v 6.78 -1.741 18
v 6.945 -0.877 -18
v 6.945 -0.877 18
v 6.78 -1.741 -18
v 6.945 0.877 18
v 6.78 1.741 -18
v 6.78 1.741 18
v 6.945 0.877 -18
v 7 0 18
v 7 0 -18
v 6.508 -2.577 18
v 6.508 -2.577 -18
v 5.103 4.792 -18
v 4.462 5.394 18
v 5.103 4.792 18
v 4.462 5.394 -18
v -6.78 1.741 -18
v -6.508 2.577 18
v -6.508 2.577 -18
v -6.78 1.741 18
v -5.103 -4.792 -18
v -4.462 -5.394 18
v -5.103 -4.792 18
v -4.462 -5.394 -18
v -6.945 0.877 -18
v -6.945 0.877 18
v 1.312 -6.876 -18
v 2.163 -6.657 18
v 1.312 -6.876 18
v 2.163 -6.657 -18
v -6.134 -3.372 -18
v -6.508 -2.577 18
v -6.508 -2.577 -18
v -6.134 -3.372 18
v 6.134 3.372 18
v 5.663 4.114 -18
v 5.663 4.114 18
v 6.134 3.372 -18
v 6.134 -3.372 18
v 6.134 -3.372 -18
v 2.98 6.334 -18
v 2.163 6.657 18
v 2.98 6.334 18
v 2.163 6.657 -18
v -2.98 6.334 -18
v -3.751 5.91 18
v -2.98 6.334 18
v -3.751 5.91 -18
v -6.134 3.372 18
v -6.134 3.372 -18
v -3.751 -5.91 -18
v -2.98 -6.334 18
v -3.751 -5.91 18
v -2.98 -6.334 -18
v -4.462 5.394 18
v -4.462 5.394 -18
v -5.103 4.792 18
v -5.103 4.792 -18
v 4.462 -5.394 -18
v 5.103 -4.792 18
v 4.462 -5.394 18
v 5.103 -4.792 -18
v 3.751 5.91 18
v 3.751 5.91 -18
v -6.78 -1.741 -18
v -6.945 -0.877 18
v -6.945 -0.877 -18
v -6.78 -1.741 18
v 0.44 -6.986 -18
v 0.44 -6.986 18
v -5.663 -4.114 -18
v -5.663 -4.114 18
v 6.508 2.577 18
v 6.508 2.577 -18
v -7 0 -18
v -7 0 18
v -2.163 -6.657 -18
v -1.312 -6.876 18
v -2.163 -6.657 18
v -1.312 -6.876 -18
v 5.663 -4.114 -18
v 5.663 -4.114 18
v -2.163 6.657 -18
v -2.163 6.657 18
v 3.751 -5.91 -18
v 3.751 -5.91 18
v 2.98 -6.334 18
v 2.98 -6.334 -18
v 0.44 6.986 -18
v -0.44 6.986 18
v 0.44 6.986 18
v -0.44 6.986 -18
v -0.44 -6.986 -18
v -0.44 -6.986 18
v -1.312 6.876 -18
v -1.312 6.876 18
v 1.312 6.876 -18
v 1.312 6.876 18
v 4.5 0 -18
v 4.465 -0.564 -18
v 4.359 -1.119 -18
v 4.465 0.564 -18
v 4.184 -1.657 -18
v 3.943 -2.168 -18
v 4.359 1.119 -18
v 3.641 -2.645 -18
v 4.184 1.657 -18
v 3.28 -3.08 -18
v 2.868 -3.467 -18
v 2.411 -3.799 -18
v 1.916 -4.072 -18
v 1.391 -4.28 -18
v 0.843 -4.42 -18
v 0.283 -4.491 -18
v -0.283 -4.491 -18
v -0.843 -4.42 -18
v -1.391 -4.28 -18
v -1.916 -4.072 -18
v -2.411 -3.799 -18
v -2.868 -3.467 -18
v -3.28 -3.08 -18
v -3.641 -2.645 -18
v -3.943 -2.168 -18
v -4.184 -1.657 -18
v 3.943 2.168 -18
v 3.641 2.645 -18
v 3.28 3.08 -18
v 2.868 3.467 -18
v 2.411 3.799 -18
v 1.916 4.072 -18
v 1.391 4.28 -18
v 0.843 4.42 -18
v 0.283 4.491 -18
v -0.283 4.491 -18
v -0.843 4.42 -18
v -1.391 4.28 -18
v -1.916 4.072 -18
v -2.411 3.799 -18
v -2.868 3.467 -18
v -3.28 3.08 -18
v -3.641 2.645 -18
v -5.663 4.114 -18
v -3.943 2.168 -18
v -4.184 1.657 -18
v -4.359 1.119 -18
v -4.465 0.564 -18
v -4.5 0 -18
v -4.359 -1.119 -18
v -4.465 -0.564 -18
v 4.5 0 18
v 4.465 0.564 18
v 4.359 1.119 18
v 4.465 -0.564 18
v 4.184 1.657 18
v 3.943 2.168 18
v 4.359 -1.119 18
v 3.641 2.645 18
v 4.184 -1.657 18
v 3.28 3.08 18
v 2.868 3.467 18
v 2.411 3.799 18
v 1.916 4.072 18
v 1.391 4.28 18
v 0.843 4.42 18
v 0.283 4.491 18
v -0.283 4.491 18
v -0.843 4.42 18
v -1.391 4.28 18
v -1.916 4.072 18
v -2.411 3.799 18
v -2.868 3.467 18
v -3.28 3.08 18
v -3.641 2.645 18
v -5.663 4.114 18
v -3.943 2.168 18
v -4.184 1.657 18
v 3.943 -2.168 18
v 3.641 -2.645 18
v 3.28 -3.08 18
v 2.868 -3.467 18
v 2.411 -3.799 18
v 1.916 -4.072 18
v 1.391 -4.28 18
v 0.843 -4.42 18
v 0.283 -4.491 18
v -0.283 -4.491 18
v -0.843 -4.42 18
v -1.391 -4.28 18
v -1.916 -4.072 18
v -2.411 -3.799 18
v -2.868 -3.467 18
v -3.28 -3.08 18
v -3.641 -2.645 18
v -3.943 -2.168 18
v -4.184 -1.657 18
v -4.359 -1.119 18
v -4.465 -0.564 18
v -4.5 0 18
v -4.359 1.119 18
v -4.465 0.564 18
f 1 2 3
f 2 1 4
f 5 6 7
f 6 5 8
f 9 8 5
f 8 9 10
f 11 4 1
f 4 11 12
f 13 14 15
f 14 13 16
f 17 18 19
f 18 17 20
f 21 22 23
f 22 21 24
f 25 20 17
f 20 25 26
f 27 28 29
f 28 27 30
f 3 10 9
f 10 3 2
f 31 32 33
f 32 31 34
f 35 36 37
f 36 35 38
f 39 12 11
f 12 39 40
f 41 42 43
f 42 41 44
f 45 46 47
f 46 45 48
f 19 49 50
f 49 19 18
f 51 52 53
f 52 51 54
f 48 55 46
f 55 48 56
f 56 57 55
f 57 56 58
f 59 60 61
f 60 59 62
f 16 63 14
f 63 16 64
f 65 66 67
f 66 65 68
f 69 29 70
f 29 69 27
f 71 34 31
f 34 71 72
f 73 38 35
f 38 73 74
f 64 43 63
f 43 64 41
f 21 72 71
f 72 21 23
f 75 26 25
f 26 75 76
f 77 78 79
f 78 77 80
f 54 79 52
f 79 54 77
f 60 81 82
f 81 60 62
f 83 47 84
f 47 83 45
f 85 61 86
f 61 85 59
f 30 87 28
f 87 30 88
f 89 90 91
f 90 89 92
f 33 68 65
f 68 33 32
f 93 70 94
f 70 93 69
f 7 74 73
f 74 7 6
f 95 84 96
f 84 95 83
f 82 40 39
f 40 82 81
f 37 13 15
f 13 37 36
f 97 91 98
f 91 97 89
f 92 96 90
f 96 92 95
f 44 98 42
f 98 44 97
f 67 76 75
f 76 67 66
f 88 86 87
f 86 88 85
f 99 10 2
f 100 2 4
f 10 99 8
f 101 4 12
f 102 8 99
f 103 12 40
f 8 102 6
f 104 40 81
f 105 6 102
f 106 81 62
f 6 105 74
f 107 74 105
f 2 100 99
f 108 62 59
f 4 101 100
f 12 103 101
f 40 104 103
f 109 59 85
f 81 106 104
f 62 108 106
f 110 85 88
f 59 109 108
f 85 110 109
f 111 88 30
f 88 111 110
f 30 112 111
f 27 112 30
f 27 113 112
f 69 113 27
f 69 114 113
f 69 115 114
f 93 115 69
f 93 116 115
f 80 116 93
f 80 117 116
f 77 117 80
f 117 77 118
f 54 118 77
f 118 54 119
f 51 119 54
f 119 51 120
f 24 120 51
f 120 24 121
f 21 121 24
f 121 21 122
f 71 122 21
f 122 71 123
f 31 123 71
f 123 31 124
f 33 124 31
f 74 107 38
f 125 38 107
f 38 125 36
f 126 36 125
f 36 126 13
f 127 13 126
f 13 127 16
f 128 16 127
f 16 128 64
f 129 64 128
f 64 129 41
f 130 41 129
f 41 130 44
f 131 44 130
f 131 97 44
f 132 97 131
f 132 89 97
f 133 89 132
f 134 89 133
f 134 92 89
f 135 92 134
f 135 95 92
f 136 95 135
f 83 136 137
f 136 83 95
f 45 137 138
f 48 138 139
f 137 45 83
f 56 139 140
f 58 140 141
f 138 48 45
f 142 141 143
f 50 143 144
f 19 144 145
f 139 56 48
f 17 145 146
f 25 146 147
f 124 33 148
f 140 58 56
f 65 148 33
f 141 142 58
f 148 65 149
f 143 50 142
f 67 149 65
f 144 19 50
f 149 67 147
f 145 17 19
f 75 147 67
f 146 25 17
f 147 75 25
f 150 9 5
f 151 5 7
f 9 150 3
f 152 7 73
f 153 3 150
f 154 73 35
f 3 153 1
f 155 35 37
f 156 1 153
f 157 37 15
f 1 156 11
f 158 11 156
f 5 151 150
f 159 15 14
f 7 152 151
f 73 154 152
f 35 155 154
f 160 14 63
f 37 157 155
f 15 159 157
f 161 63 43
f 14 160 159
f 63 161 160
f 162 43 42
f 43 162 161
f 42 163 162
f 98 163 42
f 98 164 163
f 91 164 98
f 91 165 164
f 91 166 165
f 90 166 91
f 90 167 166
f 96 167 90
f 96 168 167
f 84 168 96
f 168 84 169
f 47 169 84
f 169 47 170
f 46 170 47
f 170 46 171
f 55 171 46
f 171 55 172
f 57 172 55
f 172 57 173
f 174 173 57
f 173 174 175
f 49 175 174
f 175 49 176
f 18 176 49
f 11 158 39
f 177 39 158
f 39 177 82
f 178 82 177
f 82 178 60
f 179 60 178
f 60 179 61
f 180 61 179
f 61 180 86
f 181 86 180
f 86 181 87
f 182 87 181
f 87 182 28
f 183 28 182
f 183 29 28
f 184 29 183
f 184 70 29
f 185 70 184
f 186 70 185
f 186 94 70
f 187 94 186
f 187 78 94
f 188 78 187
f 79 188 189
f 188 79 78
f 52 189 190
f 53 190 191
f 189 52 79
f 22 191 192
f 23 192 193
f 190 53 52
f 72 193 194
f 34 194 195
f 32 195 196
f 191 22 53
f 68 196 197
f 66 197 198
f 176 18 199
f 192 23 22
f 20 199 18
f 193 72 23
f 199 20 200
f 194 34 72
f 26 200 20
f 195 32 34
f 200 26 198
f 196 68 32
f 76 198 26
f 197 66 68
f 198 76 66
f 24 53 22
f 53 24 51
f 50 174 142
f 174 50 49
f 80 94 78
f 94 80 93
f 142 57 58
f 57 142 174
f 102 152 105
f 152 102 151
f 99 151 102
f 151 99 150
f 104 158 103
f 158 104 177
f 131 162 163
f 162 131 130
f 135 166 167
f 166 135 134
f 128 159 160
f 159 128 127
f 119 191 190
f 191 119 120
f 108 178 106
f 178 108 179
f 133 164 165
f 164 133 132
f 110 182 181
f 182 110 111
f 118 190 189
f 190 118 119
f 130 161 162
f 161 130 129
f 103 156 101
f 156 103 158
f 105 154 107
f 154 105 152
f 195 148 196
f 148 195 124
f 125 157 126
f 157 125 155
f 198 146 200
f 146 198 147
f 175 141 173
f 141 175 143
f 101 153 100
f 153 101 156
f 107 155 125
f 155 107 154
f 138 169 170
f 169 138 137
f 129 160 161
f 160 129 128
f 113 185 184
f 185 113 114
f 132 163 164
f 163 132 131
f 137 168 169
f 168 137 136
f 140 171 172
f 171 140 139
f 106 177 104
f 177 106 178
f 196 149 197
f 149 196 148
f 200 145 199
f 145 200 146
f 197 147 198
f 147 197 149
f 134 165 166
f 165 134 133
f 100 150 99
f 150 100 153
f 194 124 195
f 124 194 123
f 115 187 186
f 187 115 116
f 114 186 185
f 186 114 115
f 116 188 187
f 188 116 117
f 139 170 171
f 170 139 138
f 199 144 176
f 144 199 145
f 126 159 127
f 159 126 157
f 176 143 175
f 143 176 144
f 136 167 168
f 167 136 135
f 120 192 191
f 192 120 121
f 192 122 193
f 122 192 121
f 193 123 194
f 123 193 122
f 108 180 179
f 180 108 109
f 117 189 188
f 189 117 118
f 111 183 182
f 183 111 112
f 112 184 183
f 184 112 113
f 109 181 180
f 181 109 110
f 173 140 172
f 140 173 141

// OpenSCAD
$fn = 50;


difference() {
	union() {
		translate(v = [0, 0, -18.0000000000]) {
			cylinder(h = 36, r = 7.0000000000);
		}
	}
	union() {
		translate(v = [0, 0, -100.0000000000]) {
			cylinder(h = 200, r = 4.5000000000);
		}
	}
}
